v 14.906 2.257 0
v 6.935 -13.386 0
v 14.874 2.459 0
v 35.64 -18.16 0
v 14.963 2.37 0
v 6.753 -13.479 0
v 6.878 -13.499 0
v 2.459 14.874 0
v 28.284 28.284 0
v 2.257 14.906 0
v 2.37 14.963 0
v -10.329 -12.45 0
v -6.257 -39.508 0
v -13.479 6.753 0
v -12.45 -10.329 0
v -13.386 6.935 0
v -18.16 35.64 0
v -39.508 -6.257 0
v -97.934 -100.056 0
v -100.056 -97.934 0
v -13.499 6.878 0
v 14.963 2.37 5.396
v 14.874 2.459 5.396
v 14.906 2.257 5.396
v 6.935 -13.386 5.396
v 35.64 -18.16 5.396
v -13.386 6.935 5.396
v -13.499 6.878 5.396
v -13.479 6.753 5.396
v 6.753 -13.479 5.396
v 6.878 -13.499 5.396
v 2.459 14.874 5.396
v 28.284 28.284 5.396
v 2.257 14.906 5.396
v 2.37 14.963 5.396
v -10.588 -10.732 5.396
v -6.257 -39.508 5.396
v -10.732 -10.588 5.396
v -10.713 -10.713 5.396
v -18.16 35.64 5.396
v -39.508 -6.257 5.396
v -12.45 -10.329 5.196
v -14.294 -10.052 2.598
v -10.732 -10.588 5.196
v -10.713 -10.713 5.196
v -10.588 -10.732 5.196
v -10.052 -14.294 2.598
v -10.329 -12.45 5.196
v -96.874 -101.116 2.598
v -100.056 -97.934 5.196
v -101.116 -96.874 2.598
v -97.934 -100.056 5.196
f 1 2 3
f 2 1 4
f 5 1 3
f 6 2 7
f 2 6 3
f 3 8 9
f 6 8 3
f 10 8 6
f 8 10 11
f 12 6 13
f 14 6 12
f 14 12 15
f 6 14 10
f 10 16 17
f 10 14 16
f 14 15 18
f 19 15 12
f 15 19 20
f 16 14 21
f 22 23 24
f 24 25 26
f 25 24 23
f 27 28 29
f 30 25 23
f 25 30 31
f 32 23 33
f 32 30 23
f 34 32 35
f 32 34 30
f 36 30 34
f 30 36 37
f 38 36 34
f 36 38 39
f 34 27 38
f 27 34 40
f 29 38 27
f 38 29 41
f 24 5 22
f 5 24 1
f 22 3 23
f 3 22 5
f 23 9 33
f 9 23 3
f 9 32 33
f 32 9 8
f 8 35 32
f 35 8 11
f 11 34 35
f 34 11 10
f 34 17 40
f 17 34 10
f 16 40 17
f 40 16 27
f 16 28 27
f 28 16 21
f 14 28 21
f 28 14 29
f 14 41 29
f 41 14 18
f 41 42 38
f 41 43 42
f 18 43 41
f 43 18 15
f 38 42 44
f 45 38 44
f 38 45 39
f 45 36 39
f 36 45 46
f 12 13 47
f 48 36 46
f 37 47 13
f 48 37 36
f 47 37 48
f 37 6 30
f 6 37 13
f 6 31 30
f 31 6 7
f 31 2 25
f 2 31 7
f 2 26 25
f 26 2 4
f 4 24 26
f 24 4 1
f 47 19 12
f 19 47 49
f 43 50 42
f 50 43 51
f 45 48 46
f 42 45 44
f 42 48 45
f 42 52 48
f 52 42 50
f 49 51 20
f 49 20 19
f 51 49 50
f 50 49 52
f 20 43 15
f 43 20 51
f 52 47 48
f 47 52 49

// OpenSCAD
// file: parametric_star.scad
//-- Parametric star
//-- (c)  2010 Juan Gonzalez-Gomez (Obijuan) juan@iearobotics.com
//-- GPL license

//-- The 2*N points of an N-ponted star are calculated as follows:
//-- There are two circunferences:  the inner and outer.  Outer points are located
//-- at angles: 0, 360/N, 360*2/N and on the outer circunference
//-- The inner points have the same angular distance but they are 360/(2*N) rotated
//-- respect to the outers. They are located on the inner circunference

//--- INPUT PARAMETERS:
//--- N: Number of points
//--  h: Height
//-- ri: Inner radius
//-- ro: outer radius
module parametric_star(N=5, h=3, ri=15, re=30) {

  //-- Calculate and draw a 2D tip of the star
 //-- INPUT: 
 //-- n: Number of the tip (from 0 to N-1)
  module tipstar(n) {
     i1 =  [ri*cos(-360*n/N+360/(N*2)), ri*sin(-360*n/N+360/(N*2))];
    e1 = [re*cos(-360*n/N), re*sin(-360*n/N)];
    i2 = [ri*cos(-360*(n+1)/N+360/(N*2)), ri*sin(-360*(n+1)/N+360/(N*2))];
    polygon([ i1, e1, i2]);
  }

  //-- Draw the 2D star and extrude
  
   //-- The star is the union of N 2D tips. 
   //-- A inner cylinder is also needed for filling
   //-- A flat (2D) star is built. The it is extruded
    linear_extrude(height=h) 
    union() {
      for (i=[0:N-1]) {
         tipstar(i);
      }
      rotate([0,0,360/(2*N)]) circle(r=ri+ri*0.01,$fn=N);
    }
}

//-- Example
parametric_star(N=5, ri=15/2,re=15);
// main file
//-- 5-pointed star
//-- (c)  2010 Juan Gonzalez-Gomez (Obijuan) juan@iearobotics.com
//-- GPL license

use <parametric_star.scad>

stick_len = 140;
stick_diam = 6;

rotate([0, 0, 45])
union() {
  parametric_star(ri=30/2, re=40, h = 2 * (stick_diam / 2 * cos(30) + 0.1));

  color("magenta")
  translate([-stick_len / 2, 0, stick_diam / 2 * cos(30)])
  rotate([0, 90, 0])
  rotate([0, 0, 30])
  cylinder(r = stick_diam / 2, h = stick_len, center = true, $fn = 6);
}
